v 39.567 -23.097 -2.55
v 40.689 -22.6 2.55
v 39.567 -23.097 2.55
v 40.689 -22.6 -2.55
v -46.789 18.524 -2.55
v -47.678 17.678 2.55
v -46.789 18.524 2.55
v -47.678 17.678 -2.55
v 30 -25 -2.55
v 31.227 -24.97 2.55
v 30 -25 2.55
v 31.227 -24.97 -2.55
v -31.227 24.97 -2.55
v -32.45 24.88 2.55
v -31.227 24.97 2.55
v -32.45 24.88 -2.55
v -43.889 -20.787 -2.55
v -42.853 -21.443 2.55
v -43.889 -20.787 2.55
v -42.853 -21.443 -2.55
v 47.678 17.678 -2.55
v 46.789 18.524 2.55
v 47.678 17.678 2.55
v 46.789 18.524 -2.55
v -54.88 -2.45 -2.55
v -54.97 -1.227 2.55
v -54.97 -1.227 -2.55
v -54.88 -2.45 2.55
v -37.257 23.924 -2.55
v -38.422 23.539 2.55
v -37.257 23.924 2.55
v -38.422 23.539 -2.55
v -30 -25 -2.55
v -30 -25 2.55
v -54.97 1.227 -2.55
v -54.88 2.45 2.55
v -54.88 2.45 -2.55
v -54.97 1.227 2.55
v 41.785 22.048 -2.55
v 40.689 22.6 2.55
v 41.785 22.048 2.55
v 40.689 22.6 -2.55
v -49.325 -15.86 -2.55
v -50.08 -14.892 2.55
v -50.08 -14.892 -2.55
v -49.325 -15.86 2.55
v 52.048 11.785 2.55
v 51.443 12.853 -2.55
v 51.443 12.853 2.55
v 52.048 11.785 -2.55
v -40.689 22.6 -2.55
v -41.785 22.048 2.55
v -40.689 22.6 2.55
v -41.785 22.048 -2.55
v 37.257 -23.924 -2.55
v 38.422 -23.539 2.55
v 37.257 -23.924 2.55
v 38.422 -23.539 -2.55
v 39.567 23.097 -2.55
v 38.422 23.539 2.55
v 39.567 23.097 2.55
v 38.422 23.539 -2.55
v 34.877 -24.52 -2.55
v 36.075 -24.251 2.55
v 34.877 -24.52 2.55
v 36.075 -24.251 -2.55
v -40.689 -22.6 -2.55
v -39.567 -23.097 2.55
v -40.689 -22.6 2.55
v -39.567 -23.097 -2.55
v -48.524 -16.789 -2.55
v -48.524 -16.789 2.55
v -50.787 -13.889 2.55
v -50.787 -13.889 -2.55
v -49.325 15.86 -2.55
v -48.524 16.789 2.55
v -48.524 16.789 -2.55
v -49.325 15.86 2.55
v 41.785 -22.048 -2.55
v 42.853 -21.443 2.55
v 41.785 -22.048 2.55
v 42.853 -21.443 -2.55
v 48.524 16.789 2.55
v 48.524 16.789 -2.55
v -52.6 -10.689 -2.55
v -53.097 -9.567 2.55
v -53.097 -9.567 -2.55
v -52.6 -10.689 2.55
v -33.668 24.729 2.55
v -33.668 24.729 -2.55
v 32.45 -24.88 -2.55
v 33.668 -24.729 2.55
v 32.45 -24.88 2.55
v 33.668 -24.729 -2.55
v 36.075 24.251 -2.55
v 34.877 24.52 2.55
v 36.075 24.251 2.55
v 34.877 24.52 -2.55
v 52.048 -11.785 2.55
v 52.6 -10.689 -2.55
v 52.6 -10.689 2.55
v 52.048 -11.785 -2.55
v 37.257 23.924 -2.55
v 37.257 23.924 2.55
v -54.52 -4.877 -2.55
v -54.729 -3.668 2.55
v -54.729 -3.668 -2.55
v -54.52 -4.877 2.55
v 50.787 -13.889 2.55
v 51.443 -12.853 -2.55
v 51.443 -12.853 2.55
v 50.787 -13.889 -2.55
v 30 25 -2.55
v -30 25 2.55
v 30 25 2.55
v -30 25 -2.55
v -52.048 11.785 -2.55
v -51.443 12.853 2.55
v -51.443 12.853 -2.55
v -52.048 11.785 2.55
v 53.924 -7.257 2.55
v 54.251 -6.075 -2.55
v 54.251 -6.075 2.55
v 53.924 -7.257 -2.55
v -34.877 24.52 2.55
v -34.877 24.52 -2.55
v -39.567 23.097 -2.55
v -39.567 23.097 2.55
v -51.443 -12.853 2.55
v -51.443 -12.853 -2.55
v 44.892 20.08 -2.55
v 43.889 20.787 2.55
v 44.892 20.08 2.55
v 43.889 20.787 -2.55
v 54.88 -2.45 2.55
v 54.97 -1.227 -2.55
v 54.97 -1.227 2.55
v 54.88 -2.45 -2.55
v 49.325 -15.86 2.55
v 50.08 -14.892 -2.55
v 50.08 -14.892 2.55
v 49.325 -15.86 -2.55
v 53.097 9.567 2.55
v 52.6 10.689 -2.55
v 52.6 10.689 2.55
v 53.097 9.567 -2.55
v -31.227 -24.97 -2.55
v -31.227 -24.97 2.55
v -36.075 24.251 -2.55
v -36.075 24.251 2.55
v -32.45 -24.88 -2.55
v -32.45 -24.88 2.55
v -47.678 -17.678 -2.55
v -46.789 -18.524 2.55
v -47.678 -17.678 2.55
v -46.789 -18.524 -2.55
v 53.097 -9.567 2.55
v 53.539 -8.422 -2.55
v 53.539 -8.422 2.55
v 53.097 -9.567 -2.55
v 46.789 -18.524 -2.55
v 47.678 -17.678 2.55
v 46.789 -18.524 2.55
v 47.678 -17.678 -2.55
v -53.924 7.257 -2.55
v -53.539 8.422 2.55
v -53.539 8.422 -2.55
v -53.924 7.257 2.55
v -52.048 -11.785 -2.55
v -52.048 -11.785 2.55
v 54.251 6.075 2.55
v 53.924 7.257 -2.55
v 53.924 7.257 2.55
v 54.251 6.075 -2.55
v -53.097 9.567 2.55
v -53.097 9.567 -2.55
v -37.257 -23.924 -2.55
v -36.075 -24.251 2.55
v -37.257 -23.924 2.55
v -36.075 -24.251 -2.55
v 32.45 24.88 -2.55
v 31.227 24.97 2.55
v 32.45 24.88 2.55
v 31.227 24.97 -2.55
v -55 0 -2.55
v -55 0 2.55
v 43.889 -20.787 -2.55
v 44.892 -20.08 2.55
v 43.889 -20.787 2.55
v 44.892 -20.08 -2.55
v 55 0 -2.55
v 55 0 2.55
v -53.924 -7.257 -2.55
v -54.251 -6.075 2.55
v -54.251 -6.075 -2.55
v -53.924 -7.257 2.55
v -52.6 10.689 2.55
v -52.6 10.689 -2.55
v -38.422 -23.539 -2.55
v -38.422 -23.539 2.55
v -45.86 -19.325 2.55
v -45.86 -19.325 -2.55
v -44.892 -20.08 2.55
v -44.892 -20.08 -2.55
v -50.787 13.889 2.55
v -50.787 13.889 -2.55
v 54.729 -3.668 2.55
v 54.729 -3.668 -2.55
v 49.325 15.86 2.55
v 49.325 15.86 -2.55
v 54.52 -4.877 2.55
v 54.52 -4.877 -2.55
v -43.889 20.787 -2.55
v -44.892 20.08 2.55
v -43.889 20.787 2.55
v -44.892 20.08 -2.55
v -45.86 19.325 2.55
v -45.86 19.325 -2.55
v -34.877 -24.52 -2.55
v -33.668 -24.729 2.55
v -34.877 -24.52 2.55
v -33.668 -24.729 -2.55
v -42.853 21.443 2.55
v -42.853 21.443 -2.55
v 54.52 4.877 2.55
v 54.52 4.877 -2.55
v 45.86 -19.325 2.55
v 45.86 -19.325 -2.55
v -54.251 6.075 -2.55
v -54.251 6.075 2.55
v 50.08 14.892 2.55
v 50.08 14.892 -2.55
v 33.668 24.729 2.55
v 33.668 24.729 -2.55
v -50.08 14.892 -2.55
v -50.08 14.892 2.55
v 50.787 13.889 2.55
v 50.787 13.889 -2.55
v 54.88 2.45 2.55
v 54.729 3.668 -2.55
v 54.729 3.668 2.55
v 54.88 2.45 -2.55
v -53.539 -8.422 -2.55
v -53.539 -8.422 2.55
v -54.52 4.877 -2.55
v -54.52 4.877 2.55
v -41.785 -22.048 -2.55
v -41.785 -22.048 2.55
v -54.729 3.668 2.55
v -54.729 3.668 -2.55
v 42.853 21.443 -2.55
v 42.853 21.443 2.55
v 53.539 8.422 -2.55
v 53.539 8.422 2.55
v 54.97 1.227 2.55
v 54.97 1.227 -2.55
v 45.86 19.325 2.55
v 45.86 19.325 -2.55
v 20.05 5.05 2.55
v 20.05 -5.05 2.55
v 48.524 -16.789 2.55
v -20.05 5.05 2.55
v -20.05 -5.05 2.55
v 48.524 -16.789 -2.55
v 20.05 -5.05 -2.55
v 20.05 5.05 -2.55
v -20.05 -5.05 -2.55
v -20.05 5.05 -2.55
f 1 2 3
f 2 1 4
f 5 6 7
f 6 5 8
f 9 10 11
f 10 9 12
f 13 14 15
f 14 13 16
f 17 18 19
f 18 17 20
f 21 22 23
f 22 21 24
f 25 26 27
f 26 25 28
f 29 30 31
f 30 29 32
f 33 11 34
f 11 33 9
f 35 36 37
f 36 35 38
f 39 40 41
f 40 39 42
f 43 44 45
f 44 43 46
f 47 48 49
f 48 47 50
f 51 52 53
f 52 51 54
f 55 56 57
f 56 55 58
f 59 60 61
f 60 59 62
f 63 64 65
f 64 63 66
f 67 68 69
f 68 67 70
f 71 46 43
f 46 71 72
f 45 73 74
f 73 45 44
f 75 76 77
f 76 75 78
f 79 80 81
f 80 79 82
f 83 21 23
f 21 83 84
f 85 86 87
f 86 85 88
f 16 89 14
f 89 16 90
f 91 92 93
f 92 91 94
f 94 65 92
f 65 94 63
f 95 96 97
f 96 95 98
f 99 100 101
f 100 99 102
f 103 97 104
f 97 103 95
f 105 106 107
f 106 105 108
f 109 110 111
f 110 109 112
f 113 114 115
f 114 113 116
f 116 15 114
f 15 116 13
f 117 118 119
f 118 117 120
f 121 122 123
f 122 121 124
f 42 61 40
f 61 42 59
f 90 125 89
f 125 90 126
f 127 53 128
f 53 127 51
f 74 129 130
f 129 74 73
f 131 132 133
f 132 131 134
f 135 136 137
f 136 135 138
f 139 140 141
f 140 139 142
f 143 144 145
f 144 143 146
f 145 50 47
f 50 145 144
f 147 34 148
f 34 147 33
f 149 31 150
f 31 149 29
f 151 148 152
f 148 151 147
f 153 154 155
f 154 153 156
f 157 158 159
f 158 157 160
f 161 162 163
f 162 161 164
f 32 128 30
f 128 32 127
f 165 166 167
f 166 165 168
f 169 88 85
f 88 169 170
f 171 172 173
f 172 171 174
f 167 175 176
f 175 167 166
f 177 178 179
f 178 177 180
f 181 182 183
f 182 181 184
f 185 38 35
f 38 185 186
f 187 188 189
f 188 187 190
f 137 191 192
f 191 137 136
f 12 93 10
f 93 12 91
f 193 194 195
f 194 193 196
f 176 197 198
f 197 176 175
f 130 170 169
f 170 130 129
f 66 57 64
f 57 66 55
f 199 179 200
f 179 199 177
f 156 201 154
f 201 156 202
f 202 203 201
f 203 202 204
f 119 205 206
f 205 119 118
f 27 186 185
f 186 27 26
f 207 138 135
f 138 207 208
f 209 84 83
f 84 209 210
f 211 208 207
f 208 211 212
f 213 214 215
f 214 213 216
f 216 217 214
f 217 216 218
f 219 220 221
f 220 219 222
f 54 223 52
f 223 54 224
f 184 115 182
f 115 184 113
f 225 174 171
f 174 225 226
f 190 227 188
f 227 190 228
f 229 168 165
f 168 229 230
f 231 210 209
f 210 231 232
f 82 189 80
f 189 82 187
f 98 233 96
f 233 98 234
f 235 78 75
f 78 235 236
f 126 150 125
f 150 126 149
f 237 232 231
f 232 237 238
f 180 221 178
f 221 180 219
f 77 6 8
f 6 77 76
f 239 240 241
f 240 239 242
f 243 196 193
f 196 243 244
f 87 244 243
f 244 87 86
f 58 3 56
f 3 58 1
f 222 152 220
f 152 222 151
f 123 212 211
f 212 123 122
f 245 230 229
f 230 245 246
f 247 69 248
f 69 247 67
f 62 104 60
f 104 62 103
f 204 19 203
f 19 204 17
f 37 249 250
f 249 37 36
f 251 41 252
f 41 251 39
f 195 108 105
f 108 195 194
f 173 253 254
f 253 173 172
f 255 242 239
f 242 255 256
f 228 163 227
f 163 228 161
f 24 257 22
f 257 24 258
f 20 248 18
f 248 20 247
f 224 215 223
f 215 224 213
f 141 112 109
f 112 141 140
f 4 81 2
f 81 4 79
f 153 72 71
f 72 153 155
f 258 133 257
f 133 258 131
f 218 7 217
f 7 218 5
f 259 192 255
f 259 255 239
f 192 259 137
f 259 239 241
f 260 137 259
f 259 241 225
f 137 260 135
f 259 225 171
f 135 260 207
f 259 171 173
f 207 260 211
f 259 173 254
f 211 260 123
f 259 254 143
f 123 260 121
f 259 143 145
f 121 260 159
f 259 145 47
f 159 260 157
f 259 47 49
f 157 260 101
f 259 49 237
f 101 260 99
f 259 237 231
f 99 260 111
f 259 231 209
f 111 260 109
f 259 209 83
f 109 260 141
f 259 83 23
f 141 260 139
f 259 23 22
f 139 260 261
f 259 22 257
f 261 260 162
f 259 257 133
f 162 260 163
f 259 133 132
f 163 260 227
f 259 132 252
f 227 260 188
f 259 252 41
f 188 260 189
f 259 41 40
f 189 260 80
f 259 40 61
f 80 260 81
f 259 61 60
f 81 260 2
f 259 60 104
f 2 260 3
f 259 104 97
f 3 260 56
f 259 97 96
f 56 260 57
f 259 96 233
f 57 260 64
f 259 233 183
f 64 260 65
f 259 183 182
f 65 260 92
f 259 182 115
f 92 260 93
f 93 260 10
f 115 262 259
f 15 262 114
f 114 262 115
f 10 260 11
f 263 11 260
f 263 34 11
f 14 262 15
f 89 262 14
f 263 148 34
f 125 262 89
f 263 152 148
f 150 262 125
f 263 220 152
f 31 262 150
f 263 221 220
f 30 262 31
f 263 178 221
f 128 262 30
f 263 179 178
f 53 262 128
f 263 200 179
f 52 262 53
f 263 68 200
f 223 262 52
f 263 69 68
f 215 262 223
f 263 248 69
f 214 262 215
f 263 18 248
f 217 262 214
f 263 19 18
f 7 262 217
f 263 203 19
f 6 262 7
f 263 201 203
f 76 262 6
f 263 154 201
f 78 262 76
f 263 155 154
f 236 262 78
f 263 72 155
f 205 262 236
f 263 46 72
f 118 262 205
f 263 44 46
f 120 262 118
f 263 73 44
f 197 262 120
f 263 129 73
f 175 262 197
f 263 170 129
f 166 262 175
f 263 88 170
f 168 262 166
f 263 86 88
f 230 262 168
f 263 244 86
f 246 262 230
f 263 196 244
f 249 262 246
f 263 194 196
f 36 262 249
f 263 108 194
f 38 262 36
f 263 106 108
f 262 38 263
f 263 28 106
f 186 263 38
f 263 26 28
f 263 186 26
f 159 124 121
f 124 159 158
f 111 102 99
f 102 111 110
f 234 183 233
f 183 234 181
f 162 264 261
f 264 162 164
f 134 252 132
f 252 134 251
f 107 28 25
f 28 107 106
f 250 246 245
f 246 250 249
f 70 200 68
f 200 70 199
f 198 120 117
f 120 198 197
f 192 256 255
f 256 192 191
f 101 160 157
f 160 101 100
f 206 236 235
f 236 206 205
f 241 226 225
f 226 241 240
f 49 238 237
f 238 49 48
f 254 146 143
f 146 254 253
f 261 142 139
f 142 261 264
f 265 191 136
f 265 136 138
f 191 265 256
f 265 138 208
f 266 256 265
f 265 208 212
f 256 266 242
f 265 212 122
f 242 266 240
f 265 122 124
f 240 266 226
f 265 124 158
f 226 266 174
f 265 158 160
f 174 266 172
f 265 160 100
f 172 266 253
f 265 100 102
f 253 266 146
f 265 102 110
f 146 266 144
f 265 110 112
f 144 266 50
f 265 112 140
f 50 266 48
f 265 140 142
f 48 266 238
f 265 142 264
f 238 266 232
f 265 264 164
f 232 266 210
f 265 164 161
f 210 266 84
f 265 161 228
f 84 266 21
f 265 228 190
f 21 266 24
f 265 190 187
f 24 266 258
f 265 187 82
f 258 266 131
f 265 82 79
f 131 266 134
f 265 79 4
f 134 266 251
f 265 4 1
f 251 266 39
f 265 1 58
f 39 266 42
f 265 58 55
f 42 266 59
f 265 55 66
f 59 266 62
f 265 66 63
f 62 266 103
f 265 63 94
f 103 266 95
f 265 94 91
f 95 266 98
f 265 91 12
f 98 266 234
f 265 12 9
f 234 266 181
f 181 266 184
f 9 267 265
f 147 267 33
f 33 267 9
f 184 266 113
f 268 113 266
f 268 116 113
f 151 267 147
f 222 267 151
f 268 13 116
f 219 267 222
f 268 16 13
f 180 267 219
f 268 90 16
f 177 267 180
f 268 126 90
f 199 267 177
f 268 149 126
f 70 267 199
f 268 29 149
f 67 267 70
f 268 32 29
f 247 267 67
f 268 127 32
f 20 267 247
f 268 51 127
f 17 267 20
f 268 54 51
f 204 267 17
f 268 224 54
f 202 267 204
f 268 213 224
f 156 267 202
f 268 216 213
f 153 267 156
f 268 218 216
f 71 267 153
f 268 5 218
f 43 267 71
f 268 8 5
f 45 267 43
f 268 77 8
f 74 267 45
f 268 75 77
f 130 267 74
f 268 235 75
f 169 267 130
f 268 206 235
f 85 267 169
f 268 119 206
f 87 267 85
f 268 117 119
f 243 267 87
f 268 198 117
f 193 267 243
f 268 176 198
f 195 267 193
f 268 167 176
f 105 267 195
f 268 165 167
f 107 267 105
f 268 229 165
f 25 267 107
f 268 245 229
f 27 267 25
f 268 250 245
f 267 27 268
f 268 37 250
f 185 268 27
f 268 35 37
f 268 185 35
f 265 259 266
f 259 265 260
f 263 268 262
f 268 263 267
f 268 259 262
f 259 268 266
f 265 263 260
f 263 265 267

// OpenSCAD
/*
Deathly-Hallows-OpenSCAD by Sven Minio is licensed under a Creative Commons Attribution-NonCommercial-ShareAlike 4.0 International License.
To view a copy of this license, visit http://creativecommons.org/licenses/by-nc-sa/4.0/.
Based on a work at https://github.com/k37z3r/Deathly-Hallows-OpenSCAD.
*/
difference(){
    hull(){
        translate([-30,0,0])cylinder(h=5.1, d=50, center=true, $fn=128);
        translate([30,0,0])cylinder(h=5.1, d=50, center=true, $fn=128);
    }
    cube([40.1,10.1,6], center=true);
}
